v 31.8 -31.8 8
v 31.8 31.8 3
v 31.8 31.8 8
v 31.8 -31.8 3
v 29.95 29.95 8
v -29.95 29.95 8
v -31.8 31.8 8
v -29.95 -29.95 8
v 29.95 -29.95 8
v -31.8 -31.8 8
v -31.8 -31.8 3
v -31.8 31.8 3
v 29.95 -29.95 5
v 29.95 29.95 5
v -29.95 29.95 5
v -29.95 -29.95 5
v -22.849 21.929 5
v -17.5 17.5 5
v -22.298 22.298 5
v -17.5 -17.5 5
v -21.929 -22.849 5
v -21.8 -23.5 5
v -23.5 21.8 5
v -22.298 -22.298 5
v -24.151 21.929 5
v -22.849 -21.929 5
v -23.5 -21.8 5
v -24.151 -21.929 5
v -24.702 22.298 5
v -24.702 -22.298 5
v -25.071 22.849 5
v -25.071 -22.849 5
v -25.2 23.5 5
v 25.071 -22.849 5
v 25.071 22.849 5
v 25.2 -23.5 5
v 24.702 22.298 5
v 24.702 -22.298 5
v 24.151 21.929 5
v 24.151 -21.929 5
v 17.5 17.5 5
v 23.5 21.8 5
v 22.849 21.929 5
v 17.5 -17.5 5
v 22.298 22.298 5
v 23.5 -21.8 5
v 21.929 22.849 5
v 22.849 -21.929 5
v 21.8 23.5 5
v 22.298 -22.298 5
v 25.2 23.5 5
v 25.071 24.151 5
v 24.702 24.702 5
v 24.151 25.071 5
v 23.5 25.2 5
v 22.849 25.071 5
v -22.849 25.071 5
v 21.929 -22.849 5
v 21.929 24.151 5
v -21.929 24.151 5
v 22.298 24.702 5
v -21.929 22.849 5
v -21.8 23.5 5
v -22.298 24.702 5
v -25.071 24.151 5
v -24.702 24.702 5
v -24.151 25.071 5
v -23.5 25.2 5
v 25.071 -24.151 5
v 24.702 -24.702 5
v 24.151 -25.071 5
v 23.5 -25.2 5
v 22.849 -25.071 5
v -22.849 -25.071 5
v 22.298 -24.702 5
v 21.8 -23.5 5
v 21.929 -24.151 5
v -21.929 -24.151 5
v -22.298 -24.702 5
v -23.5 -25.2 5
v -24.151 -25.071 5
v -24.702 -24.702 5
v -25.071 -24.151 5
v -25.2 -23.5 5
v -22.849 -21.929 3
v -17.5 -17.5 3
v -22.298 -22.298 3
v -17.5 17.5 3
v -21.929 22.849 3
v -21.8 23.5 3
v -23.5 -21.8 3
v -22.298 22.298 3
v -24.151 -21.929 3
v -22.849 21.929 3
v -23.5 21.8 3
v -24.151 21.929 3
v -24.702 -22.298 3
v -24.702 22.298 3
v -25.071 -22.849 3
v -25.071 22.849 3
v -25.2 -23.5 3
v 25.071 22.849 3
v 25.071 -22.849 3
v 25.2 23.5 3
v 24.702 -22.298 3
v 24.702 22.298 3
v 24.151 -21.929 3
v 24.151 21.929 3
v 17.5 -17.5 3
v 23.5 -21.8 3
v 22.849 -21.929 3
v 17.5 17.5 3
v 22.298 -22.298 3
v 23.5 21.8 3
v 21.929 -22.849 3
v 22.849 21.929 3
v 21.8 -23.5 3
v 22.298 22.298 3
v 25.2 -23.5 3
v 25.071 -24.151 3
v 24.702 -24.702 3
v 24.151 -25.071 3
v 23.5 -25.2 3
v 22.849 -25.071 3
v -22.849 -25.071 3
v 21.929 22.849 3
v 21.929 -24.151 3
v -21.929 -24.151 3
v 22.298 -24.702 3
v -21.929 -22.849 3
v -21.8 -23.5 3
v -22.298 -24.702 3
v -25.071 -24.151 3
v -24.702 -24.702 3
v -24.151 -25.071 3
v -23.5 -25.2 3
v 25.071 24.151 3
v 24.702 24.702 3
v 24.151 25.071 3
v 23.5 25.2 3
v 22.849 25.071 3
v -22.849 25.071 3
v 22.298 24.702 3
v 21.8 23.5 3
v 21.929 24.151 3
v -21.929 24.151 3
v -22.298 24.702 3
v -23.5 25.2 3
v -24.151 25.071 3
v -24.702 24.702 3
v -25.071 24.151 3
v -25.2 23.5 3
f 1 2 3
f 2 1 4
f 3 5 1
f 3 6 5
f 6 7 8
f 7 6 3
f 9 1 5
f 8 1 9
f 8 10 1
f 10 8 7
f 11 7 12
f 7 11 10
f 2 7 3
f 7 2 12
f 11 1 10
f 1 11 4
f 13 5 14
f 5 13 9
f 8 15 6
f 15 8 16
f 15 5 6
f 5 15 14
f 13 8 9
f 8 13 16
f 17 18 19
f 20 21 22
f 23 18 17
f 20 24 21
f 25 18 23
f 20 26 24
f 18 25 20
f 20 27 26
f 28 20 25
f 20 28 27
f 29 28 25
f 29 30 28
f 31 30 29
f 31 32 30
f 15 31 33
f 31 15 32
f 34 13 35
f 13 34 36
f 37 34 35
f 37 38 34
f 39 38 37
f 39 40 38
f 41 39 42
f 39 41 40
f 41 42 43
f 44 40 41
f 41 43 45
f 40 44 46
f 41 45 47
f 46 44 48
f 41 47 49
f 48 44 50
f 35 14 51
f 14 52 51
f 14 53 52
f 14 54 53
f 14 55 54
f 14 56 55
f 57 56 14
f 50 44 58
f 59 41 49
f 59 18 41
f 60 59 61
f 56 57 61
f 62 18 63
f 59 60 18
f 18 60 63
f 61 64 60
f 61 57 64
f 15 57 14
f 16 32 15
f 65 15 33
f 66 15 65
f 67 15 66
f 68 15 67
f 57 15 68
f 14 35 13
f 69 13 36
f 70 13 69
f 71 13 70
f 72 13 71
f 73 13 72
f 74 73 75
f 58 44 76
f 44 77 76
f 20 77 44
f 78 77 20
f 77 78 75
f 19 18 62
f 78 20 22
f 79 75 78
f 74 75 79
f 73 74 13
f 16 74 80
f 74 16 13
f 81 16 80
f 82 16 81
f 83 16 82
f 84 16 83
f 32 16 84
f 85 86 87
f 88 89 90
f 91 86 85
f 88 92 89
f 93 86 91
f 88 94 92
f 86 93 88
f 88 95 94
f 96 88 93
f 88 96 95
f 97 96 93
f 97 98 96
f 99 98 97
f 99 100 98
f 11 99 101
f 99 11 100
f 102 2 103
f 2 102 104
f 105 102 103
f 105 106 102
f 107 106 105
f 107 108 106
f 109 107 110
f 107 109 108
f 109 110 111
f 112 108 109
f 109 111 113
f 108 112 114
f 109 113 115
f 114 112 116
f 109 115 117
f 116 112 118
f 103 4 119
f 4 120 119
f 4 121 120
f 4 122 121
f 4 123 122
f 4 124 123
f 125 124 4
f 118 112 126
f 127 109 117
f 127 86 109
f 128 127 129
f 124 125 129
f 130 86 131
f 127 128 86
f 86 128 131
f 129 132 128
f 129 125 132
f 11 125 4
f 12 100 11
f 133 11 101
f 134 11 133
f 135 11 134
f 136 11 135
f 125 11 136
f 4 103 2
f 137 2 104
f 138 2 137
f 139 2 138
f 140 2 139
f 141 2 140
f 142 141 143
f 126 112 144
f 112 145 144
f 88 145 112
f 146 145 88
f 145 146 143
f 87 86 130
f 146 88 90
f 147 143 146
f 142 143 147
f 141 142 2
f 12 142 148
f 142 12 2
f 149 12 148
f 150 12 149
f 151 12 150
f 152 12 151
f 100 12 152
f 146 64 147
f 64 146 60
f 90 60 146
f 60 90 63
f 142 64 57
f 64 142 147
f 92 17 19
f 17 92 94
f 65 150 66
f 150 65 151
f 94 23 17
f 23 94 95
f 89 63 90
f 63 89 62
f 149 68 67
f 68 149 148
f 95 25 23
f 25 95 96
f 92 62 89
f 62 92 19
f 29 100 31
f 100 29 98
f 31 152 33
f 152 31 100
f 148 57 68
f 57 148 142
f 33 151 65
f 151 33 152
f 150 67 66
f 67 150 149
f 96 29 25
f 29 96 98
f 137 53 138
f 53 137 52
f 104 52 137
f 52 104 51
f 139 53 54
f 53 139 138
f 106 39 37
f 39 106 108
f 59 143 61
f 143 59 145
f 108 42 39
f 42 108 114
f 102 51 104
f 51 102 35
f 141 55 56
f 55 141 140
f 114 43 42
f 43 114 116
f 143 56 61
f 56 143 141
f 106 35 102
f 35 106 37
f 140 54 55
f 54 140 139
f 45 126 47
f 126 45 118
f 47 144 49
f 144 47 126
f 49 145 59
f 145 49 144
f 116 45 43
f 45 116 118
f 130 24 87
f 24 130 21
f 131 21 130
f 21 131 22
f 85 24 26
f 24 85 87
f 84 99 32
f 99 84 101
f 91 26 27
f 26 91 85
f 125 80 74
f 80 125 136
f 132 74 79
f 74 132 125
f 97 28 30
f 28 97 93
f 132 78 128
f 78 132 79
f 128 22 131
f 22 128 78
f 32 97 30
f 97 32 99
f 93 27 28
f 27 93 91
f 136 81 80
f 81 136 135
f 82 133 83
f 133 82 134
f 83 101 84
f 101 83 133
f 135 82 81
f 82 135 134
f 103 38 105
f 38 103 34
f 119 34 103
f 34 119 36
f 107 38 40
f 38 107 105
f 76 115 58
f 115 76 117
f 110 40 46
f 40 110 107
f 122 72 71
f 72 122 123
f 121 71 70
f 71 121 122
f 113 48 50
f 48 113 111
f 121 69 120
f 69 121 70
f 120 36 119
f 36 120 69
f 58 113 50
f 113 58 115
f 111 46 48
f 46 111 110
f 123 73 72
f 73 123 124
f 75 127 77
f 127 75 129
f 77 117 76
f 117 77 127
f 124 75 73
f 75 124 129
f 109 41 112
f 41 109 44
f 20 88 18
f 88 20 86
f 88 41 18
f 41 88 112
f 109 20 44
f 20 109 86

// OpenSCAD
// file: part-Microbutton.scad
microButton();

_buttonLength = 10;
_buttonWidth = 20;
_buttonDepth = 6.5;
_pinLength = 4;
_pinWidth = 0.8;
_pinDepth = 3.5;

// ---------------------------------------------------------------------------------

function getButtonLength() = _buttonLength;
function getButtonWidth() = _buttonWidth;
function getButtonDepth() = _buttonDepth;

function getPinLength() = _pinLength;

// ---------------------------------------------------------------------------------


module microButton(
    buttonLength = 10,
    buttonWidth = 20,
    buttonDepth = 6.5,
    pinLength = 4,
    pinWidth = 0.8,
    pinDepth = 3.5,
    polygons = 32
) {
    union() {    
        translate([0,0,pinLength])
        color("blue")
        difference() {
            cube([buttonDepth,buttonWidth,buttonLength]);
            
            translate([-1,5,3])
            rotate([0,90,0])
            cylinder(d=2.8 ,h=buttonDepth+5, $fn=polygons);
            
            translate([-1,buttonWidth-5,3])
            rotate([0,90,0])
            cylinder(d=2.8 ,h=buttonDepth+5, $fn=polygons);
        }
        // 3 pins
        translate([(buttonDepth-pinDepth)/2,1+pinWidth/2,0])
        color("darkgrey")
        difference() {
            cube([pinDepth,pinWidth,pinLength]);
            translate([pinDepth/2,-0.1,1])
            rotate([0,90,90])
            cylinder(d=1.5 ,h=pinWidth+0.2, $fn=polygons);
        }
        translate([(buttonDepth-pinDepth)/2,buttonWidth/2 - pinWidth/2,0])
        color("darkgrey")
        difference() {
            cube([pinDepth,pinWidth,pinLength]);
            translate([pinDepth/2,-0.1,1])
            rotate([0,90,90])
            cylinder(d=1.5 ,h=pinWidth+0.2, $fn=polygons);
        }
        
        translate([(buttonDepth-pinDepth)/2,buttonWidth-(2+pinWidth/2),0])
        color("darkgrey")
        difference() {
            cube([pinDepth,pinWidth,pinLength]);
            translate([pinDepth/2,-0.1,1])
            rotate([0,90,90])
            cylinder(d=1.5 ,h=pinWidth+0.2, $fn=polygons);
        }
        
        // aktuator
        translate([0,3,buttonLength+pinLength])
        color("grey")
        rotate([8,0,0])
        cube([buttonDepth,18,0.5]);
    }
}
// file: part-Motor_PSM35BYG104.scad
use <lib-Threads.scad>

//use <part-Shaft_Coupling.scad>


// ++++++++++++++++++++++++++++++++++++
// Motor parameter
// ++++++++++++++++++++++++++++++++++++
motorWidth=35;
motorHeight=35;
motorDepth=20;

motorShaftHeight=20;
motorShaftDiameter=5;
motorShaftTolerance=0.001; // +0,1%


// ---------------------------------------------------------------------------------


module PSM35BYG104 (
	shaftCouplingHeight=20,
	shaftCouplingDiameter=8,
	numberOfLockingScrews=1,
	lockingScrew="None",
	lockingScrewHeight=15,
    debug=true
) 

difference () 
{
    union() 
    {  
        translate([0,0,motorDepth]) 
        {
        difference () 
        {     
            color([0.3,0.3,0.3]) cylinder(motorShaftHeight, motorShaftDiameter/2, motorShaftDiameter/2, $fn=100);

//            shaftCoupling(
//                shaftCouplingHeight, 
//                shaftCouplingDiameter, 
//                motorShaftHeight+(motorShaftHeight*motorShaftTolerance), 
//                motorShaftDiameter+(motorShaftDiameter*motorShaftTolerance), 
//                numberOfLockingScrews,
//                lockingScrew, 
//                lockingScrewHeight
//            );
        }
        }
        
        union() 
        {
            translate([0,0,(motorDepth)]) 
            {
            color([0.5,0.5,0.5]) cylinder(2, 22/2, 22/2 -0.1, $fn=100);
            }
            translate([0,0,(motorDepth/2)]) 
            { 
                color([0.6,0.6,0.6]) cube(size = [motorWidth,motorHeight,motorDepth], center = true);
            }            
        }
    }
     
    translate([12.95,12.95,0]) 
    {
        metricThread(name="M3", height=motorDepth, internalThread=true, debug=debug);
    }
    translate([-12.95,12.95,0]) 
    {
        metricThread(name="M3", height=motorDepth, internalThread=true, debug=debug);
    }
    translate([12.95,-12.95,0]) 
    {
        metricThread(name="M3", height=motorDepth, internalThread=true, debug=debug);
    }
    translate([-12.95,-12.95,0]) 
    {
        metricThread(name="M3", height=motorDepth, internalThread=true, debug=debug);
    }
    translate([motorWidth/2,0,3.5]) 
    {
        cube(size = [2,8,5], center = true);
    }
}



// ---------------------------------------------------------------------------------

function getMotorWidth() = motorWidth;
function getMotorHeight() = motorHeight;
function getMotorDepth() = motorDepth;

function getMotorShaftHeight() = motorShaftHeight;
function getMotorShaftDiameter() = motorShaftDiameter;
function getMotorShaftTolerance() = motorShaftTolerance;

// ---------------------------------------------------------------------------------

PSM35BYG104();

   
// main file
use <lib-Metric_Threads.scad>
use<part-Motor_PSM35BYG104.scad>
use<part-Microbutton.scad>



buttonHeight = getMotorDepth() + 3;

if (false) {
translate([(getButtonWidth()*1.02)/2 + 7.7,getMotorWidth()/2 + 3,buttonHeight - 7]) {
    rotate([0,0,90])
    microButton();
} 

translate([-11,-getMotorWidth()/2 -1.5,buttonHeight - 2])
rotate([0,0,-90])
GP2Y0D805Z0F();






translate([getMotorWidth()/2 + 2,getMotorWidth()/2 + 3,4])
connector10PinMale();


translate([0,0,2])
PSM35BYG104();
}




color("green")
mountPSM35BYG104_5_basePlate_2();
//
//color([0.9,0.9,0.9,0.9])
//mountPSM35BYG104_5();



wallStrength = 2;
basePlateHeigth = 1.5;
edgeHeight = 2;

module mountPSM35BYG104_5_basePlate_2() {
    
    mountHeight = getMotorDepth()+10;
    
    translate([0,0,4])
    difference() {
    
 
        
            union() {
            
                   
                   
                   
          
            
            cube(size = [getMotorWidth()+(wallStrength*2) + (20.6) + wallStrength*2,getMotorHeight()+(wallStrength*2)+ (20.6) + wallStrength*2,wallStrength], center= true);
            translate([0,0,wallStrength])
                difference() {
             // torso
                    
                    cube(size = [getMotorWidth()+(wallStrength*2) + (20.6) + wallStrength*2,getMotorHeight()+(wallStrength*2)+ (20.6) + wallStrength*2,wallStrength*2], center= true);
                
                    
                      cube(size = [getMotorWidth()+(wallStrength*2) + (20.9),getMotorHeight()+(wallStrength*2)+ (20.9) ,wallStrength*2], center= true);
                }
    
            }
        
        
//        // base plate      
        
        // screw holes
        translate([-getMotorWidth()/2-6,(getMotorHeight()/2+6),-5 ])
               cylinder(d=3.4,mountHeight*3, $fn=16);
        
        translate([getMotorWidth()/2+6,(getMotorHeight()/2+6),-5 ])
               cylinder(d=3.4,mountHeight*3, $fn=16);
        
        translate([-getMotorWidth()/2-6,-(getMotorHeight()/2+6),-5])
               cylinder(d=3.4,mountHeight*3, $fn=16);
 
        translate([getMotorWidth()/2+6,-(getMotorHeight()/2+6),-5])
               cylinder(d=3.4,mountHeight*3, $fn=16);

       // torso
                    translate([0,0,-1])
                    cube(size = [getMotorWidth(),getMotorHeight(),mountHeight], center= true);
     
}
}

module mountPSM35BYG104_5_basePlate() {
    
    mountHeight = getMotorDepth()+10;
    
    difference() {
    
        union() {
        
            
            difference() {
                    
                    // motor hole
                    translate([0,0,wallStrength/2])
                    cube(size = [getMotorWidth()+(wallStrength*2) + (20 - wallStrength),getMotorHeight()+(wallStrength*2)+ (20 - wallStrength),wallStrength], center= true);
                
                    // torso
                    translate([0,0,wallStrength/2])
                    cube(size = [getMotorWidth()+(wallStrength*2) + 0.6,getMotorHeight()+(wallStrength*2)+ 0.6,wallStrength], center= true);
                   
            }
            
            
    
        }
        
//        // base plate      
        
        
        translate([-getMotorWidth()/2-6,(getMotorHeight()/2+6),0 ])
               cylinder(d=3.4,mountHeight*2, $fn=16);
        
         
        
        translate([-getMotorWidth()/2-6,-(getMotorHeight()/2+6),0])
               cylinder(d=3.4,mountHeight*2, $fn=16);
 
        translate([getMotorWidth()/2+6,-(getMotorHeight()/2+6),0])
               cylinder(d=3.4,mountHeight*2, $fn=16);
      
        
  

    
     
}
}

module mountPSM35BYG104_5() {
    
    mountHeight = getMotorDepth()+10;
    
    difference() {
    
        union() {
        
            difference() {
                    // torso
                    translate([0,0,mountHeight/2])
                    cube(size = [getMotorWidth()+(wallStrength*2),getMotorHeight()+(wallStrength*2),mountHeight], center= true);
                    // motor hole
                    translate([0,0,mountHeight+wallStrength/2])
                    cube(size = [getMotorWidth()*1.05,getMotorHeight()*1.05,mountHeight*2], center= true);
            }
            
            difference() {
                    // torso
                    translate([0,0,mountHeight/2])
                    cube(size = [getMotorWidth()+(wallStrength*2) + 20 + 0.6,getMotorHeight()+(wallStrength*2) + 20 + 0.6,mountHeight], center= true);
                    // motor hole
                    translate([0,0,mountHeight])
                    cube(size = [getMotorWidth()+(wallStrength*2) + (20 - wallStrength) + 0.6,getMotorHeight()+(wallStrength*2)+ (20 - wallStrength) + 0.6,mountHeight*2], center= true);
                
                    
                    translate([0,0,mountHeight])
                    cube(size = [getMotorWidth()*1.05,getMotorHeight()*1.05,mountHeight*2], center= true);
            }
            
            
            
            
//                
//                
//            }
            
            // construction structure
            constructionPosition = (getMotorWidth()+(wallStrength*2) + (20 - wallStrength) + 0.6)/2;
            
            constructionSteps = constructionPosition/5;
            constructionFeetLength = 20;
            
            for (i = [0:1:10]) {
                if (i == 3 || i == 7) {                
                    translate([constructionPosition-14,-constructionPosition - 0.5 + constructionSteps*i,0])
                    cube(size=[14, 3,  1]);
                } else {
                    translate([constructionPosition,-constructionPosition - 0.5 + constructionSteps*i,0])
                    cube(size=[constructionFeetLength, 1,  0.5]);
                }
                rotate([0,0,180])
                if (i == 3  || i == 7) {                
                    translate([constructionPosition-14,-constructionPosition - 0.5 + constructionSteps*i,0])
                    cube(size=[14, 3,  1]);
                } else {
                    translate([constructionPosition,-constructionPosition - 0.5 + constructionSteps*i,0])
                    cube(size=[constructionFeetLength, 1,  0.5]);
                }
                
                 rotate([0,0,90])
                if (i == 3  || i == 7) {                
                    translate([constructionPosition-14,-constructionPosition - 0.5 + constructionSteps*i,0])
                    cube(size=[14, 3,  1]);
                } else {
                    translate([constructionPosition,-constructionPosition - 0.5 + constructionSteps*i,0])
                    cube(size=[constructionFeetLength, 1,  0.5]);
                }
                
                 rotate([0,0,270])
                if (i == 3 || i == 7) {                
                    translate([constructionPosition-14,-constructionPosition - 0.5 + constructionSteps*i,0])
                    cube(size=[14, 3,  1]);
                } else {
                    translate([constructionPosition,-constructionPosition - 0.5 + constructionSteps*i,0])
                    cube(size=[constructionFeetLength, 1,  0.5]);
                }
            }
            
                // edges
//                translate([-getMotorWidth()/2-10,(getMotorHeight()/2+10),(mountHeight- wallStrength)/2 + wallStrength])
//                cube(size = [3,3,mountHeight - wallStrength], center= true);
//                
//                translate([-getMotorWidth()/2-10,-(getMotorHeight()/2+10),(mountHeight- wallStrength)/2 + wallStrength])
//                cube(size = [3,3,mountHeight - wallStrength], center= true);
//                
//                 translate([getMotorWidth()/2+10,-(getMotorHeight()/2+10),(mountHeight- wallStrength)/2 + wallStrength])
//                cube(size = [3,3,mountHeight - wallStrength], center= true);
//            
            
            
                
               
                // sites
                
                // no function               
                difference() {
                translate([-getMotorWidth()/2-7,0,mountHeight - 10])
                    cube(size = [10,getMotorWidth()+(wallStrength*2)+ 20 + 0.6,20], center= true);
            
                translate([-getMotorWidth()/2-6,0,mountHeight - 10 - 9])
                    rotate([0,45,0])
                    cube(size = [10,getMotorWidth()+(wallStrength*2)+ 20 + 0.6,10], center= true);
                }        
                
                // IR sensor
                rotate([0,0,90])
                difference() {
                translate([-getMotorWidth()/2-7,-5.15,mountHeight - 10])
                    cube(size = [10,getMotorWidth()+(wallStrength*2)+ 10.3,20], center= true);
            
                translate([-getMotorWidth()/2-6,-5.15,mountHeight - 10 - 9])
                    rotate([0,45,0])
                    cube(size = [10,getMotorWidth()+(wallStrength*2)+ 10.3,10], center= true);
                }                
               
                
                // motor cable
                difference() {
                translate([+getMotorWidth()/2+7,-7,mountHeight - 10])
                    cube(size = [10,25,20], center= true);
            
                translate([+getMotorWidth()/2+6,-7,mountHeight - 10 - 9])
                    rotate([0,45,0])
                    cube(size = [10,25,10], center= true);
                }
//                difference() {
//                translate([+getMotorWidth()/2+7,3,mountHeight - 5])
//                    cube(size = [10,25,10], center= true);
//            
//                translate([+getMotorWidth()/2+7,3,mountHeight - 3 - 9])
//                    rotate([0,45,0])
//                    cube(size = [10,25,10], center= true);
//                }
             
                difference() {
                translate([+getMotorWidth()/2+7,17,mountHeight - 3])
                    cube(size = [10,25,6], center= true);
            
                translate([+getMotorWidth()/2+8,17,mountHeight - 2.5 - 5])
                    rotate([0,45,0])
                    cube(size = [10,25,6], center= true);
                }
                
                // microbutton
                rotate([0,0,90])
                difference() {
                translate([+getMotorWidth()/2+7,0,mountHeight - 10])
                    cube(size = [10,getMotorWidth()+(wallStrength*2),20], center= true);
            
                translate([+getMotorWidth()/2+6,0,mountHeight - 10 - 9])
                    rotate([0,45,0])
                    cube(size = [10,getMotorWidth()+(wallStrength*2),10], center= true);
                }
                
                translate([getMotorWidth()/2 + wallStrength - 1,getMotorWidth()/2 - wallStrength - 1,wallStrength])
                cube([1,15,20*1.03]);
                
                
                
                // 10 pin side wall feet
                translate([getMotorWidth()/2 + wallStrength -2,getMotorWidth()/2 + 1 ,0])
                cube([2,11,wallStrength]);
                
             
                translate([getMotorWidth()/2 + wallStrength -1,getMotorWidth()/2  ,0])
                cube([11,2,wallStrength]);
            
        }
        
           
        
        
        
        translate([-getMotorWidth()/2-6,(getMotorHeight()/2+6),(mountHeight- wallStrength)/2 + wallStrength])
               cylinder(d=3.3,mountHeight - wallStrength, $fn=16);
        
         translate([-getMotorWidth()/2-6,(getMotorHeight()/2+6),(mountHeight) - wallStrength - 1])
               cylinder(d=6,h=wallStrength + 1, $fn=16);
        
        
        translate([-getMotorWidth()/2-6,-(getMotorHeight()/2+6),(mountHeight- wallStrength)/2 + wallStrength])
               cylinder(d=3.3,mountHeight - wallStrength, $fn=16);
        
         translate([-getMotorWidth()/2-6,-(getMotorHeight()/2+6),(mountHeight) - wallStrength - 1])
               cylinder(d=6,h=wallStrength + 1, $fn=16);
        
        translate([getMotorWidth()/2+6,-(getMotorHeight()/2+6),(mountHeight- wallStrength)/2 + wallStrength])
               cylinder(d=3.3,mountHeight - wallStrength, $fn=16);
        
         translate([getMotorWidth()/2+6,-(getMotorHeight()/2+6),(mountHeight) - wallStrength - 1])
               cylinder(d=6,h=wallStrength + 1, $fn=16);
        
        
        // connection screws
        for (i = [0:90:360]) {
            rotate([0,0,i])
                translate([12.95, 12.95, -5 ])
                {
                    cylinder(d=3, h=10, $fn=32);
                }
        }
        
        // motor cable hole
        translate([getMotorWidth()/2 + wallStrength - 0.2,0,1])
            difference() {
            rotate([45,0,0])
            cube(size = [2,15,15], center = true);
            translate([0,0,-10])
            cube(size = [2,21,21], center = true);
            }
        
        
        
         // 10 Pin Connector hole
            translate([getMotorWidth()/2 + wallStrength - 0.2,getMotorWidth()/2 - wallStrength - 0,wallStrength + 2])
                cube([9*1.05,20,20*1.03]);
            
        // microbutton hole
       
        translate([-2.65,(getMotorHeight()/2)  ,buttonHeight - 7]) 
            difference() {
                
                cube([getButtonWidth()*1.05,getButtonDepth()*1.05 + 3,getButtonLength()+getPinLength() + 20]);
                                        
                // pin foots
                translate([5,0,0])
                cube([3,getButtonDepth()*1.05+ 3,getPinLength()*0.80]);
                
                translate([13,0,0])
                cube([3,getButtonDepth()*1.05+ 3,getPinLength()*0.80]);
            }
            
       translate([-7,(getMotorHeight()/2) , buttonHeight +5])       
         cube([getButtonWidth()*1.05 ,getButtonDepth()*1.05 + 3,10]);
                
        // microbutton holes
        translate([getButtonWidth() - 7.1,(getMotorHeight()/2) + getButtonDepth(),buttonHeight ]) 
        rotate([90,0,0])
        cylinder(d=3.2,h=wallStrength*10, center= true, $fn=32);
        
        translate([getButtonWidth() - 17.1,(getMotorHeight()/2) + getButtonDepth(),buttonHeight]) 
        rotate([90,0,0])
        cylinder(d=3.2,h=wallStrength*10, center= true, $fn=32);
            
            
            
        // IR sensor
        translate([-(22*1.05)/2,-(getMotorHeight()/2) - 11,buttonHeight - 4]) 
        difference() {
            cube([22*1.05,11,getButtonLength()+getPinLength() + 0]);
            
            // pin foots
            translate([0,0,0])
            cube([7,11,1.5]);
            
        }
        
        translate([8.55,-(getMotorHeight()/2) - 11,buttonHeight - 11]) 
        cube([3,9,9]);
            
        translate([-8,-(getMotorHeight()/2) - 6,buttonHeight - 11]) 
        cylinder(d=3, h=20, $fn=16);
        
        translate([-12,-(getMotorHeight()/2) - 9,buttonHeight - 15]) 
        cube([6,6,8]);
        
        // driveshaft cable
        translate([-getMotorWidth()/2 - 2,0,mountHeight-1])
            rotate([0,-45,0])
            cube(size = [6,20,10], center = true);
        
       translate([-getMotorWidth()/2 - 9,0,mountHeight-8])
            rotate([0,45,0])
            cylinder(d=5, h=9, $fn=16);
        
         translate([-getMotorWidth()/2 - 7,0,mountHeight-12])
            cube(size = [3.5,7,8], center = true);
        
        rotate([0,0,180])
        translate([-getMotorWidth()/2 - 2,0,mountHeight-1])
            rotate([0,-45,0])
            cube(size = [6,20,10], center = true);
        rotate([0,0,180])
       translate([-getMotorWidth()/2 - 9,0,mountHeight-8])
            rotate([0,45,0])
            cylinder(d=5, h=9, $fn=16);
        rotate([0,0,180])
         translate([-getMotorWidth()/2 - 7,0,mountHeight-12])
            cube(size = [3.5,7,8], center = true);
    }
    
     
}




module mountPSM35BYG104_4()
{

mountHeight = getMotorDepth()+10;


difference()
{

    union()
    {

        difference() 
        {
            // torso
            translate([0,0,mountHeight/2])
            cube(size = [getMotorWidth()+(wallStrength*2),getMotorHeight()+(wallStrength*2),mountHeight], center= true);
            // motor hole
            translate([0,0,mountHeight+basePlateHeigth])
            cube(size = [getMotorWidth()*1.05,getMotorHeight()*1.05,mountHeight*2], center= true);
            
            // connection screws
            for (i = [0:90:360]) {
                rotate([0,0,i])
                    translate([12.95, 12.95, -5 ])
                    {
                        cylinder(d=3, h=10, $fn=32);
                    }
            }
            
//            // 6 Pin Connector hole
//            translate([getMotorWidth()/2 - 1,getMotorWidth()/2 - 6,1.5])
//                cube([9*1.05,20,15*1.05]);
//            
//            translate([getMotorWidth()/2 +2.5,-getMotorWidth()/2,1.5])
//                cube([6,getMotorWidth(),15*1.05]);
            
            // 10 Pin Connector hole
            translate([getMotorWidth()/2 - 1,getMotorWidth()/2 - 6,1.5])
                cube([9*1.05,20,20*1.05]);
            
            translate([getMotorWidth()/2 +2.5,-getMotorWidth()/2,1.5])
                cube([6,getMotorWidth(),15*1.05]);
            
            
            
            
            
            rotate([0,0,90])
            translate([getMotorWidth()/2 - 1,-getMotorWidth()/2 -6,1.5])
                cube([9*1.05,10,15*1.05]);
            
            rotate([0,0,90])
            translate([getMotorWidth()/2 +2.5,-getMotorWidth()/2,5.5])
                cube([6,getMotorWidth(),10*1.05]);
            
            
            
            
            
            // motor cable hole
            translate([getMotorWidth()/2,0,4])
                cube(size = [9,10,5], center = true);
            
            
            // microbutton hole
            translate([-(getButtonWidth()*1.02)/2,(getMotorHeight()/2),buttonHeight - 7]) 
                difference() {
                    cube([getButtonWidth()*1.02,getButtonDepth(),getButtonLength()+getPinLength() + 20]);
                    
                    // pin foots
                    translate([5,0,0])
                    cube([3,getButtonDepth(),getPinLength()*0.80]);
                    
                    translate([13,0,0])
                    cube([3,getButtonDepth(),getPinLength()*0.80]);
                }
                
                
            // ir sensor hole
            translate([-(22*1.05)/2,-(getMotorHeight()/2) -wallStrength + 0,buttonHeight - 5]) 
                difference() {
                    cube([22*1.05,10,getButtonLength()+getPinLength() + 20]);
                    
                    // pin foots
                    translate([0,0,0])
                    cube([5,getButtonDepth(),getPinLength()*0.80]);
                    
                }
            
        }

        translate([getMotorWidth()/2 +0.88 ,getMotorWidth()/2 - 7.5,1.5])
            cube([8,8,2]);
        
        translate([getMotorWidth()/2 +0.88 ,getMotorWidth()/2 - 7.5,21])
            cube([8.5,8,2]);

    }
        
}

}




module GP2Y0D805Z0F() {
    
    union() {
    
    difference() {
        cube([9,22,2]);
        translate([4.5,2,0])
            cylinder(d=3, h=2, $fn=32);
    }
        translate([1.5,5,0])
        cube([6,14,8]);
    
        translate([0,20,-2])
        cube([9,2,2]);
    
        translate([1.5,21,-10])
        cylinder(d=1, h=10);
    
         translate([4.5,21,-10])
        cylinder(d=1, h=10);
    
         translate([7.5,21,-10])
        cylinder(d=1, h=10);
    }
}


module connector10PinMale() {
    
    union() {
    
    difference() {
        cube([9,9,20.5]);
        
        translate([1,2,1])
        cube([7,7,18.5]);
    }
    
        translate([3,9,5])
        rotate([90,0,0])
        cylinder(d=1, h=12);
    
        translate([6,9,5])
        rotate([90,0,0])
        cylinder(d=1, h=12);
    
        translate([3,9,7.5])
        rotate([90,0,0])
        cylinder(d=1, h=12);
    
        translate([6,9,7.5])
        rotate([90,0,0])
        cylinder(d=1, h=12);
    
        translate([3,9,10])
        rotate([90,0,0])
        cylinder(d=1, h=12);
    
        translate([6,9,10])
        rotate([90,0,0])
        cylinder(d=1, h=12);
        
         translate([3,9,12.5])
        rotate([90,0,0])
        cylinder(d=1, h=12);
    
        translate([6,9,12.5])
        rotate([90,0,0])
        cylinder(d=1, h=12);
        
         translate([3,9,15])
        rotate([90,0,0])
        cylinder(d=1, h=12);
    
        translate([6,9,15])
        rotate([90,0,0])
        cylinder(d=1, h=12);
    
    }
}

module connector6PinMale() {
    
    union() {
    
    difference() {
        cube([9,9,15.5]);
        
        translate([1,2,1])
        cube([7,7,13.5]);
    }
    
        translate([3,9,5])
        rotate([90,0,0])
        cylinder(d=1, h=12);
    
        translate([6,9,5])
        rotate([90,0,0])
        cylinder(d=1, h=12);
    
        translate([3,9,7.5])
        rotate([90,0,0])
        cylinder(d=1, h=12);
    
        translate([6,9,7.5])
        rotate([90,0,0])
        cylinder(d=1, h=12);
    
        translate([3,9,10])
        rotate([90,0,0])
        cylinder(d=1, h=12);
    
        translate([6,9,10])
        rotate([90,0,0])
        cylinder(d=1, h=12);
    
    }
}


module mountPSM35BYG104_3()
{

difference()
{

    union()
    {

        difference() 
        {
            translate([ 0.00, 0.00, (getMotorDepth()/2) + basePlateHeigth])
            {
                // torso
                cube(size = [getMotorWidth()+wallStrength,getMotorHeight()+wallStrength,getMotorDepth()], center = true);
            }   
            // motor hole
            cube(size = [getMotorWidth()*1.05,getMotorHeight()*1.05,50], center = true);
        }



        // internal edge spaces
        for (i = [0:90:360]) {
            rotate([0,0,i])
            translate([(getMotorWidth()/2) - wallStrength/2,(getMotorWidth()/2) - wallStrength/2,basePlateHeigth])
            {
                rotate([0,0,0]) 
                cube(size = [wallStrength/1.1,wallStrength/1.1,edgeHeight]);
                   
                
            }
        }        
        
        // base plate
        translate([ 0.00, 0.00, basePlateHeigth/2 ])
        {
            cube(size = [getMotorWidth()+wallStrength,getMotorHeight()+wallStrength,basePlateHeigth], center = true);
        }
        
        
        // microbutton         
        translate([-(getMotorWidth()+wallStrength)/2, (getMotorHeight()/2) + 0.85, 0 ])
        {
            cube([getMotorWidth()+wallStrength,getButtonDepth() + wallStrength/2 - 1,getMotorDepth()+basePlateHeigth+getButtonLength() + 1]);
             
        }
        
        // spiral cable         
        translate([-(getMotorWidth()+wallStrength)/2, -(getMotorWidth()/2) - (getButtonDepth() + wallStrength/2 - 1) - 0.85, 0 ])
        {
            cube([getMotorWidth()+wallStrength,getButtonDepth() + wallStrength/2 - 1,getMotorDepth()+basePlateHeigth+getButtonLength() + 1]);
             
        }
        
    }


    // motor cable hole
    translate([ getMotorWidth()/2, 0.00, (getMotorDepth()/2) + basePlateHeigth + edgeHeight])
    {
        cube(size = [getMotorWidth()/3,getMotorHeight()/4,getMotorDepth()], center = true);
    }



    // connection screws
    for (i = [0:90:360]) {
        rotate([0,0,i])
            translate([12.95, 12.95, -5 ])
            {
                cylinder(d=3, h=10, $fn=32);
            }
    }
   
    // microbutton hole
    translate([-(getMotorWidth()+wallStrength)/2+getButtonWidth()/2.15 ,(getMotorHeight()/2),buttonHeight - 5]) 
        difference() {
            cube([getButtonWidth()*1.02,getButtonDepth(),getButtonLength()+getPinLength() + 20]);
            
            // pin foots
            translate([5,0,0])
            cube([3,getButtonDepth(),getPinLength()*0.80]);
            
            translate([13,0,0])
            cube([3,getButtonDepth(),getPinLength()*0.80]);
        }
        
        // microbutton cable holes
        translate([8,(getMotorHeight()/2) + wallStrength,buttonHeight - 4]) 
        rotate([90,0,0])
        cylinder(d=4,h=wallStrength*3, center= true, $fn=32);
        
        translate([0.3,(getMotorHeight()/2) + wallStrength,buttonHeight - 4]) 
        rotate([90,0,0])
        cylinder(d=4,h=wallStrength*3, center= true, $fn=32);
        
        translate([-7.7,(getMotorHeight()/2) + wallStrength,buttonHeight - 4]) 
        rotate([90,0,0])
        cylinder(d=4,h=wallStrength*3, center= true, $fn=32);
        
        
      
        // microbutton holes
        translate([5,(getMotorHeight()/2) + wallStrength,buttonHeight + 2]) 
        rotate([90,0,0])
        cylinder(d=3,h=wallStrength*3, center= true, $fn=32);
        
        translate([-5,(getMotorHeight()/2) + wallStrength,buttonHeight + 2]) 
        rotate([90,0,0])
        cylinder(d=3,h=wallStrength*3, center= true, $fn=32);
        
        // cable holes
        translate([4,-((getMotorHeight()/2) + wallStrength),buttonHeight + 2]) 
        rotate([90,0,0])
        cylinder(d=5,h=wallStrength*3, center= true, $fn=32);
        
        translate([-4,-((getMotorHeight()/2) + wallStrength),buttonHeight + 2]) 
        rotate([90,0,0])
        cylinder(d=5,h=wallStrength*3, center= true, $fn=32);
        
        translate([-12,-((getMotorHeight()/2) + wallStrength),buttonHeight + 2]) 
        rotate([90,0,0])
        cylinder(d=5,h=wallStrength*3, center= true, $fn=32);
        
        translate([12,-((getMotorHeight()/2) + wallStrength),buttonHeight + 2]) 
        rotate([90,0,0])
        cylinder(d=5,h=wallStrength*3, center= true, $fn=32);
        
}

}




module mountPSM35BYG104_2()
{

difference()
{

    union()
    {

        difference() 
        {
            translate([ 0.00, 0.00, (getMotorDepth()/2) + basePlateHeigth])
            {
                // torso
                cube(size = [getMotorWidth()+wallStrength,getMotorHeight()+wallStrength,getMotorDepth()], center = true);
            }   
            // motor hole
            cube(size = [getMotorWidth()*1.05,getMotorHeight()*1.05,50], center = true);
        }



        // internal edge spaces
        for (i = [0:90:360]) {
            rotate([0,0,i])
            translate([(getMotorWidth()/2) - wallStrength/2,(getMotorWidth()/2) - wallStrength/2,basePlateHeigth])
            {
                rotate([0,0,0]) 
                cube(size = [wallStrength/1.1,wallStrength/1.1,edgeHeight]);
                   
                
            }
        }        
        
        // base plate
        translate([ 0.00, 0.00, basePlateHeigth/2 ])
        {
            cube(size = [getMotorWidth()+wallStrength,getMotorHeight()+wallStrength,basePlateHeigth], center = true);
        }
        
        
        // microbutton         
        translate([-(getMotorWidth()+wallStrength)/2, (getMotorHeight()/2) + 0.8, 0 ])
        {
            cube([getMotorWidth()+wallStrength,getButtonDepth() + wallStrength/2 - 1,getMotorDepth()+basePlateHeigth+getButtonLength() + 1]);
             
        }
        
    }


    // motor cable hole
    translate([ getMotorWidth()/2, 0.00, (getMotorDepth()/2) + basePlateHeigth + edgeHeight])
    {
        cube(size = [getMotorWidth()/3,getMotorHeight()/4,getMotorDepth()], center = true);
    }



    // connection screws
    for (i = [0:90:360]) {
        rotate([0,0,i])
            translate([12.95, 12.95, -5 ])
            {
                cylinder(d=3, h=10, $fn=32);
            }
    }
   
    // microbutton hole
    translate([-(getMotorWidth()+wallStrength)/2+getButtonWidth()/2.1 ,(getMotorHeight()/2),buttonHeight - 5]) 
        difference() {
            cube([getButtonWidth()*1.05,getButtonDepth(),getButtonLength()+getPinLength()]);
            
            // pin foots
            translate([getButtonWidth()/5,0,0])
            cube([5,getButtonDepth(),getPinLength()*0.90]);
            
            translate([getButtonWidth()-(getButtonWidth()/5 ) - 4,0,0])
            cube([5,getButtonDepth(),getPinLength()*0.90]);
        }
        
        // microbutton cable holes
        translate([-getButtonWidth()/2.45,(getMotorHeight()/2) + wallStrength,buttonHeight - 4]) 
        rotate([90,0,0])
        cylinder(d=2,h=wallStrength*3, center= true, $fn=32);
        
        translate([0.5,(getMotorHeight()/2) + wallStrength,buttonHeight - 4]) 
        rotate([90,0,0])
        cylinder(d=2,h=wallStrength*3, center= true, $fn=32);
        
        translate([getButtonWidth()/2.45,(getMotorHeight()/2) + wallStrength,buttonHeight - 4]) 
        rotate([90,0,0])
        cylinder(d=2,h=wallStrength*3, center= true, $fn=32);
        
        
      
        
        translate([5,(getMotorHeight()/2) + wallStrength,buttonHeight + 2]) 
        rotate([90,0,0])
        cylinder(d=3,h=wallStrength*3, center= true, $fn=32);
        
        translate([-5,(getMotorHeight()/2) + wallStrength,buttonHeight + 2]) 
        rotate([90,0,0])
        cylinder(d=3,h=wallStrength*3, center= true, $fn=32);
        
}

}


module mountPSM35BYG104()
{

difference()
{

    union()
    {

        difference() 
        {
            translate([ 0.00, 0.00, (getMotorDepth()/2) + basePlateHeigth])
            {
                // torso
                cube(size = [getMotorWidth()+wallStrength,getMotorHeight()+wallStrength,getMotorDepth()], center = true);
            }   
            // motor hole
            cube(size = [getMotorWidth(),getMotorHeight(),50], center = true);
        }



        // internal edge spaces
        for (i = [45:90:360]) {
            rotate([0,0,i])
            translate([(getMotorWidth()/2 + wallStrength), 0, edgeHeight/2 +basePlateHeigth])
            {
                //rotate([0,0,i]) 
                    union() {
                        cube(size = [2,8.5,edgeHeight], center = true);
                        translate([ 1, 0, 0.00 ]) { cube(size = [4,4,edgeHeight], center = true); }
                    }
                
            }
        }        
        
        // base plate
        translate([ 0.00, 0.00, basePlateHeigth/2 ])
        {
            cube(size = [getMotorWidth()+wallStrength,getMotorHeight()+wallStrength,basePlateHeigth], center = true);
        }
    }


    // motor cable hole
    translate([ getMotorWidth()/2, 0.00, (getMotorDepth()/2) + basePlateHeigth + edgeHeight])
    {
        cube(size = [getMotorWidth()/3,getMotorHeight()/4,getMotorDepth()], center = true);
    }



    // connection screws
    for (i = [0:90:360]) {
        rotate([0,0,i])
            translate([12.95, 12.95, -5 ])
            {
                cylinder(d=3, h=10, $fn=32);
            }
    }
  
}

}
